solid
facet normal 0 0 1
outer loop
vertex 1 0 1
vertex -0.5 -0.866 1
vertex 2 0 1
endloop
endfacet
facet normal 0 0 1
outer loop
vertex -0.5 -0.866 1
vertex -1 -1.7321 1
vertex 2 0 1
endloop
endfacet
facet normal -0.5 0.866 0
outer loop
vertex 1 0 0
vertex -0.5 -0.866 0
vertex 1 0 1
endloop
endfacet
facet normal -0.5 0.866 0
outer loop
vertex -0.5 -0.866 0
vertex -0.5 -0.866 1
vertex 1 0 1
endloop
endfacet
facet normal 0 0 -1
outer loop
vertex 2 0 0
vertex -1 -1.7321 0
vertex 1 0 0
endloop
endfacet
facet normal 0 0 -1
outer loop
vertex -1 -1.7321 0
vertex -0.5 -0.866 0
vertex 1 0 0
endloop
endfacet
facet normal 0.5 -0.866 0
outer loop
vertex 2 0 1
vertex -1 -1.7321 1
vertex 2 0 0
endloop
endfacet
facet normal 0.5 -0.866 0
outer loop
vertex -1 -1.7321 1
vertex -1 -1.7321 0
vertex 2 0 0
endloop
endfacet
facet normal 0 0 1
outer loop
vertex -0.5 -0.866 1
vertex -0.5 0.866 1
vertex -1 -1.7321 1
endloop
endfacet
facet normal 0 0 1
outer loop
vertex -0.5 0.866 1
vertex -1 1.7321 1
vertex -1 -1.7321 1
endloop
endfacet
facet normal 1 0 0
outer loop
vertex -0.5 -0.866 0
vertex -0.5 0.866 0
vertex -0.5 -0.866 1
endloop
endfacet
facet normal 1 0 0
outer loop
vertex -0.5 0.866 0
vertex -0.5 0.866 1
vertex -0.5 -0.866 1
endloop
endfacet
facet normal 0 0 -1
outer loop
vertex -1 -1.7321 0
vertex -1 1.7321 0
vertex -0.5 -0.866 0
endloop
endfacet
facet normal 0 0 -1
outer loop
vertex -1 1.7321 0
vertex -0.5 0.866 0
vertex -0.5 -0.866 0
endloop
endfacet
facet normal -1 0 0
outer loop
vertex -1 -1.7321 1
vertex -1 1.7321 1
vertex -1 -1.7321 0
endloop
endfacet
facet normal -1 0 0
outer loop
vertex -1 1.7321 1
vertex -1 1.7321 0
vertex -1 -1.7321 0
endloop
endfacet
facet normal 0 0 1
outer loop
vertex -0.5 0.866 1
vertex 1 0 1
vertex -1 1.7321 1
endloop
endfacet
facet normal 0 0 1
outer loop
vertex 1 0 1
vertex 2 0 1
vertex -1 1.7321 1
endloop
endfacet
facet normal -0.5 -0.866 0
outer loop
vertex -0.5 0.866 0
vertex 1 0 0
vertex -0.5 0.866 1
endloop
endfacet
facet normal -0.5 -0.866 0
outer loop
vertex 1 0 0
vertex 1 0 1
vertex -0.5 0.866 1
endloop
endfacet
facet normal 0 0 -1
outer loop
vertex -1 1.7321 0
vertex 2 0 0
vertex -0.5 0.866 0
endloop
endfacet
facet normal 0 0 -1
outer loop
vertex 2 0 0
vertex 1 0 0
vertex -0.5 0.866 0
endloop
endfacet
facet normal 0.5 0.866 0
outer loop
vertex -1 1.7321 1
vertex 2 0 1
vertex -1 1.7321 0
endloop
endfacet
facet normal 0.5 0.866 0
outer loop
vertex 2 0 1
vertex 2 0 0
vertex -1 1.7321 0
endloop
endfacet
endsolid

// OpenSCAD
rotate_extrude(angle=-720, $fn=3) translate([-2,0]) square([1,1]);
